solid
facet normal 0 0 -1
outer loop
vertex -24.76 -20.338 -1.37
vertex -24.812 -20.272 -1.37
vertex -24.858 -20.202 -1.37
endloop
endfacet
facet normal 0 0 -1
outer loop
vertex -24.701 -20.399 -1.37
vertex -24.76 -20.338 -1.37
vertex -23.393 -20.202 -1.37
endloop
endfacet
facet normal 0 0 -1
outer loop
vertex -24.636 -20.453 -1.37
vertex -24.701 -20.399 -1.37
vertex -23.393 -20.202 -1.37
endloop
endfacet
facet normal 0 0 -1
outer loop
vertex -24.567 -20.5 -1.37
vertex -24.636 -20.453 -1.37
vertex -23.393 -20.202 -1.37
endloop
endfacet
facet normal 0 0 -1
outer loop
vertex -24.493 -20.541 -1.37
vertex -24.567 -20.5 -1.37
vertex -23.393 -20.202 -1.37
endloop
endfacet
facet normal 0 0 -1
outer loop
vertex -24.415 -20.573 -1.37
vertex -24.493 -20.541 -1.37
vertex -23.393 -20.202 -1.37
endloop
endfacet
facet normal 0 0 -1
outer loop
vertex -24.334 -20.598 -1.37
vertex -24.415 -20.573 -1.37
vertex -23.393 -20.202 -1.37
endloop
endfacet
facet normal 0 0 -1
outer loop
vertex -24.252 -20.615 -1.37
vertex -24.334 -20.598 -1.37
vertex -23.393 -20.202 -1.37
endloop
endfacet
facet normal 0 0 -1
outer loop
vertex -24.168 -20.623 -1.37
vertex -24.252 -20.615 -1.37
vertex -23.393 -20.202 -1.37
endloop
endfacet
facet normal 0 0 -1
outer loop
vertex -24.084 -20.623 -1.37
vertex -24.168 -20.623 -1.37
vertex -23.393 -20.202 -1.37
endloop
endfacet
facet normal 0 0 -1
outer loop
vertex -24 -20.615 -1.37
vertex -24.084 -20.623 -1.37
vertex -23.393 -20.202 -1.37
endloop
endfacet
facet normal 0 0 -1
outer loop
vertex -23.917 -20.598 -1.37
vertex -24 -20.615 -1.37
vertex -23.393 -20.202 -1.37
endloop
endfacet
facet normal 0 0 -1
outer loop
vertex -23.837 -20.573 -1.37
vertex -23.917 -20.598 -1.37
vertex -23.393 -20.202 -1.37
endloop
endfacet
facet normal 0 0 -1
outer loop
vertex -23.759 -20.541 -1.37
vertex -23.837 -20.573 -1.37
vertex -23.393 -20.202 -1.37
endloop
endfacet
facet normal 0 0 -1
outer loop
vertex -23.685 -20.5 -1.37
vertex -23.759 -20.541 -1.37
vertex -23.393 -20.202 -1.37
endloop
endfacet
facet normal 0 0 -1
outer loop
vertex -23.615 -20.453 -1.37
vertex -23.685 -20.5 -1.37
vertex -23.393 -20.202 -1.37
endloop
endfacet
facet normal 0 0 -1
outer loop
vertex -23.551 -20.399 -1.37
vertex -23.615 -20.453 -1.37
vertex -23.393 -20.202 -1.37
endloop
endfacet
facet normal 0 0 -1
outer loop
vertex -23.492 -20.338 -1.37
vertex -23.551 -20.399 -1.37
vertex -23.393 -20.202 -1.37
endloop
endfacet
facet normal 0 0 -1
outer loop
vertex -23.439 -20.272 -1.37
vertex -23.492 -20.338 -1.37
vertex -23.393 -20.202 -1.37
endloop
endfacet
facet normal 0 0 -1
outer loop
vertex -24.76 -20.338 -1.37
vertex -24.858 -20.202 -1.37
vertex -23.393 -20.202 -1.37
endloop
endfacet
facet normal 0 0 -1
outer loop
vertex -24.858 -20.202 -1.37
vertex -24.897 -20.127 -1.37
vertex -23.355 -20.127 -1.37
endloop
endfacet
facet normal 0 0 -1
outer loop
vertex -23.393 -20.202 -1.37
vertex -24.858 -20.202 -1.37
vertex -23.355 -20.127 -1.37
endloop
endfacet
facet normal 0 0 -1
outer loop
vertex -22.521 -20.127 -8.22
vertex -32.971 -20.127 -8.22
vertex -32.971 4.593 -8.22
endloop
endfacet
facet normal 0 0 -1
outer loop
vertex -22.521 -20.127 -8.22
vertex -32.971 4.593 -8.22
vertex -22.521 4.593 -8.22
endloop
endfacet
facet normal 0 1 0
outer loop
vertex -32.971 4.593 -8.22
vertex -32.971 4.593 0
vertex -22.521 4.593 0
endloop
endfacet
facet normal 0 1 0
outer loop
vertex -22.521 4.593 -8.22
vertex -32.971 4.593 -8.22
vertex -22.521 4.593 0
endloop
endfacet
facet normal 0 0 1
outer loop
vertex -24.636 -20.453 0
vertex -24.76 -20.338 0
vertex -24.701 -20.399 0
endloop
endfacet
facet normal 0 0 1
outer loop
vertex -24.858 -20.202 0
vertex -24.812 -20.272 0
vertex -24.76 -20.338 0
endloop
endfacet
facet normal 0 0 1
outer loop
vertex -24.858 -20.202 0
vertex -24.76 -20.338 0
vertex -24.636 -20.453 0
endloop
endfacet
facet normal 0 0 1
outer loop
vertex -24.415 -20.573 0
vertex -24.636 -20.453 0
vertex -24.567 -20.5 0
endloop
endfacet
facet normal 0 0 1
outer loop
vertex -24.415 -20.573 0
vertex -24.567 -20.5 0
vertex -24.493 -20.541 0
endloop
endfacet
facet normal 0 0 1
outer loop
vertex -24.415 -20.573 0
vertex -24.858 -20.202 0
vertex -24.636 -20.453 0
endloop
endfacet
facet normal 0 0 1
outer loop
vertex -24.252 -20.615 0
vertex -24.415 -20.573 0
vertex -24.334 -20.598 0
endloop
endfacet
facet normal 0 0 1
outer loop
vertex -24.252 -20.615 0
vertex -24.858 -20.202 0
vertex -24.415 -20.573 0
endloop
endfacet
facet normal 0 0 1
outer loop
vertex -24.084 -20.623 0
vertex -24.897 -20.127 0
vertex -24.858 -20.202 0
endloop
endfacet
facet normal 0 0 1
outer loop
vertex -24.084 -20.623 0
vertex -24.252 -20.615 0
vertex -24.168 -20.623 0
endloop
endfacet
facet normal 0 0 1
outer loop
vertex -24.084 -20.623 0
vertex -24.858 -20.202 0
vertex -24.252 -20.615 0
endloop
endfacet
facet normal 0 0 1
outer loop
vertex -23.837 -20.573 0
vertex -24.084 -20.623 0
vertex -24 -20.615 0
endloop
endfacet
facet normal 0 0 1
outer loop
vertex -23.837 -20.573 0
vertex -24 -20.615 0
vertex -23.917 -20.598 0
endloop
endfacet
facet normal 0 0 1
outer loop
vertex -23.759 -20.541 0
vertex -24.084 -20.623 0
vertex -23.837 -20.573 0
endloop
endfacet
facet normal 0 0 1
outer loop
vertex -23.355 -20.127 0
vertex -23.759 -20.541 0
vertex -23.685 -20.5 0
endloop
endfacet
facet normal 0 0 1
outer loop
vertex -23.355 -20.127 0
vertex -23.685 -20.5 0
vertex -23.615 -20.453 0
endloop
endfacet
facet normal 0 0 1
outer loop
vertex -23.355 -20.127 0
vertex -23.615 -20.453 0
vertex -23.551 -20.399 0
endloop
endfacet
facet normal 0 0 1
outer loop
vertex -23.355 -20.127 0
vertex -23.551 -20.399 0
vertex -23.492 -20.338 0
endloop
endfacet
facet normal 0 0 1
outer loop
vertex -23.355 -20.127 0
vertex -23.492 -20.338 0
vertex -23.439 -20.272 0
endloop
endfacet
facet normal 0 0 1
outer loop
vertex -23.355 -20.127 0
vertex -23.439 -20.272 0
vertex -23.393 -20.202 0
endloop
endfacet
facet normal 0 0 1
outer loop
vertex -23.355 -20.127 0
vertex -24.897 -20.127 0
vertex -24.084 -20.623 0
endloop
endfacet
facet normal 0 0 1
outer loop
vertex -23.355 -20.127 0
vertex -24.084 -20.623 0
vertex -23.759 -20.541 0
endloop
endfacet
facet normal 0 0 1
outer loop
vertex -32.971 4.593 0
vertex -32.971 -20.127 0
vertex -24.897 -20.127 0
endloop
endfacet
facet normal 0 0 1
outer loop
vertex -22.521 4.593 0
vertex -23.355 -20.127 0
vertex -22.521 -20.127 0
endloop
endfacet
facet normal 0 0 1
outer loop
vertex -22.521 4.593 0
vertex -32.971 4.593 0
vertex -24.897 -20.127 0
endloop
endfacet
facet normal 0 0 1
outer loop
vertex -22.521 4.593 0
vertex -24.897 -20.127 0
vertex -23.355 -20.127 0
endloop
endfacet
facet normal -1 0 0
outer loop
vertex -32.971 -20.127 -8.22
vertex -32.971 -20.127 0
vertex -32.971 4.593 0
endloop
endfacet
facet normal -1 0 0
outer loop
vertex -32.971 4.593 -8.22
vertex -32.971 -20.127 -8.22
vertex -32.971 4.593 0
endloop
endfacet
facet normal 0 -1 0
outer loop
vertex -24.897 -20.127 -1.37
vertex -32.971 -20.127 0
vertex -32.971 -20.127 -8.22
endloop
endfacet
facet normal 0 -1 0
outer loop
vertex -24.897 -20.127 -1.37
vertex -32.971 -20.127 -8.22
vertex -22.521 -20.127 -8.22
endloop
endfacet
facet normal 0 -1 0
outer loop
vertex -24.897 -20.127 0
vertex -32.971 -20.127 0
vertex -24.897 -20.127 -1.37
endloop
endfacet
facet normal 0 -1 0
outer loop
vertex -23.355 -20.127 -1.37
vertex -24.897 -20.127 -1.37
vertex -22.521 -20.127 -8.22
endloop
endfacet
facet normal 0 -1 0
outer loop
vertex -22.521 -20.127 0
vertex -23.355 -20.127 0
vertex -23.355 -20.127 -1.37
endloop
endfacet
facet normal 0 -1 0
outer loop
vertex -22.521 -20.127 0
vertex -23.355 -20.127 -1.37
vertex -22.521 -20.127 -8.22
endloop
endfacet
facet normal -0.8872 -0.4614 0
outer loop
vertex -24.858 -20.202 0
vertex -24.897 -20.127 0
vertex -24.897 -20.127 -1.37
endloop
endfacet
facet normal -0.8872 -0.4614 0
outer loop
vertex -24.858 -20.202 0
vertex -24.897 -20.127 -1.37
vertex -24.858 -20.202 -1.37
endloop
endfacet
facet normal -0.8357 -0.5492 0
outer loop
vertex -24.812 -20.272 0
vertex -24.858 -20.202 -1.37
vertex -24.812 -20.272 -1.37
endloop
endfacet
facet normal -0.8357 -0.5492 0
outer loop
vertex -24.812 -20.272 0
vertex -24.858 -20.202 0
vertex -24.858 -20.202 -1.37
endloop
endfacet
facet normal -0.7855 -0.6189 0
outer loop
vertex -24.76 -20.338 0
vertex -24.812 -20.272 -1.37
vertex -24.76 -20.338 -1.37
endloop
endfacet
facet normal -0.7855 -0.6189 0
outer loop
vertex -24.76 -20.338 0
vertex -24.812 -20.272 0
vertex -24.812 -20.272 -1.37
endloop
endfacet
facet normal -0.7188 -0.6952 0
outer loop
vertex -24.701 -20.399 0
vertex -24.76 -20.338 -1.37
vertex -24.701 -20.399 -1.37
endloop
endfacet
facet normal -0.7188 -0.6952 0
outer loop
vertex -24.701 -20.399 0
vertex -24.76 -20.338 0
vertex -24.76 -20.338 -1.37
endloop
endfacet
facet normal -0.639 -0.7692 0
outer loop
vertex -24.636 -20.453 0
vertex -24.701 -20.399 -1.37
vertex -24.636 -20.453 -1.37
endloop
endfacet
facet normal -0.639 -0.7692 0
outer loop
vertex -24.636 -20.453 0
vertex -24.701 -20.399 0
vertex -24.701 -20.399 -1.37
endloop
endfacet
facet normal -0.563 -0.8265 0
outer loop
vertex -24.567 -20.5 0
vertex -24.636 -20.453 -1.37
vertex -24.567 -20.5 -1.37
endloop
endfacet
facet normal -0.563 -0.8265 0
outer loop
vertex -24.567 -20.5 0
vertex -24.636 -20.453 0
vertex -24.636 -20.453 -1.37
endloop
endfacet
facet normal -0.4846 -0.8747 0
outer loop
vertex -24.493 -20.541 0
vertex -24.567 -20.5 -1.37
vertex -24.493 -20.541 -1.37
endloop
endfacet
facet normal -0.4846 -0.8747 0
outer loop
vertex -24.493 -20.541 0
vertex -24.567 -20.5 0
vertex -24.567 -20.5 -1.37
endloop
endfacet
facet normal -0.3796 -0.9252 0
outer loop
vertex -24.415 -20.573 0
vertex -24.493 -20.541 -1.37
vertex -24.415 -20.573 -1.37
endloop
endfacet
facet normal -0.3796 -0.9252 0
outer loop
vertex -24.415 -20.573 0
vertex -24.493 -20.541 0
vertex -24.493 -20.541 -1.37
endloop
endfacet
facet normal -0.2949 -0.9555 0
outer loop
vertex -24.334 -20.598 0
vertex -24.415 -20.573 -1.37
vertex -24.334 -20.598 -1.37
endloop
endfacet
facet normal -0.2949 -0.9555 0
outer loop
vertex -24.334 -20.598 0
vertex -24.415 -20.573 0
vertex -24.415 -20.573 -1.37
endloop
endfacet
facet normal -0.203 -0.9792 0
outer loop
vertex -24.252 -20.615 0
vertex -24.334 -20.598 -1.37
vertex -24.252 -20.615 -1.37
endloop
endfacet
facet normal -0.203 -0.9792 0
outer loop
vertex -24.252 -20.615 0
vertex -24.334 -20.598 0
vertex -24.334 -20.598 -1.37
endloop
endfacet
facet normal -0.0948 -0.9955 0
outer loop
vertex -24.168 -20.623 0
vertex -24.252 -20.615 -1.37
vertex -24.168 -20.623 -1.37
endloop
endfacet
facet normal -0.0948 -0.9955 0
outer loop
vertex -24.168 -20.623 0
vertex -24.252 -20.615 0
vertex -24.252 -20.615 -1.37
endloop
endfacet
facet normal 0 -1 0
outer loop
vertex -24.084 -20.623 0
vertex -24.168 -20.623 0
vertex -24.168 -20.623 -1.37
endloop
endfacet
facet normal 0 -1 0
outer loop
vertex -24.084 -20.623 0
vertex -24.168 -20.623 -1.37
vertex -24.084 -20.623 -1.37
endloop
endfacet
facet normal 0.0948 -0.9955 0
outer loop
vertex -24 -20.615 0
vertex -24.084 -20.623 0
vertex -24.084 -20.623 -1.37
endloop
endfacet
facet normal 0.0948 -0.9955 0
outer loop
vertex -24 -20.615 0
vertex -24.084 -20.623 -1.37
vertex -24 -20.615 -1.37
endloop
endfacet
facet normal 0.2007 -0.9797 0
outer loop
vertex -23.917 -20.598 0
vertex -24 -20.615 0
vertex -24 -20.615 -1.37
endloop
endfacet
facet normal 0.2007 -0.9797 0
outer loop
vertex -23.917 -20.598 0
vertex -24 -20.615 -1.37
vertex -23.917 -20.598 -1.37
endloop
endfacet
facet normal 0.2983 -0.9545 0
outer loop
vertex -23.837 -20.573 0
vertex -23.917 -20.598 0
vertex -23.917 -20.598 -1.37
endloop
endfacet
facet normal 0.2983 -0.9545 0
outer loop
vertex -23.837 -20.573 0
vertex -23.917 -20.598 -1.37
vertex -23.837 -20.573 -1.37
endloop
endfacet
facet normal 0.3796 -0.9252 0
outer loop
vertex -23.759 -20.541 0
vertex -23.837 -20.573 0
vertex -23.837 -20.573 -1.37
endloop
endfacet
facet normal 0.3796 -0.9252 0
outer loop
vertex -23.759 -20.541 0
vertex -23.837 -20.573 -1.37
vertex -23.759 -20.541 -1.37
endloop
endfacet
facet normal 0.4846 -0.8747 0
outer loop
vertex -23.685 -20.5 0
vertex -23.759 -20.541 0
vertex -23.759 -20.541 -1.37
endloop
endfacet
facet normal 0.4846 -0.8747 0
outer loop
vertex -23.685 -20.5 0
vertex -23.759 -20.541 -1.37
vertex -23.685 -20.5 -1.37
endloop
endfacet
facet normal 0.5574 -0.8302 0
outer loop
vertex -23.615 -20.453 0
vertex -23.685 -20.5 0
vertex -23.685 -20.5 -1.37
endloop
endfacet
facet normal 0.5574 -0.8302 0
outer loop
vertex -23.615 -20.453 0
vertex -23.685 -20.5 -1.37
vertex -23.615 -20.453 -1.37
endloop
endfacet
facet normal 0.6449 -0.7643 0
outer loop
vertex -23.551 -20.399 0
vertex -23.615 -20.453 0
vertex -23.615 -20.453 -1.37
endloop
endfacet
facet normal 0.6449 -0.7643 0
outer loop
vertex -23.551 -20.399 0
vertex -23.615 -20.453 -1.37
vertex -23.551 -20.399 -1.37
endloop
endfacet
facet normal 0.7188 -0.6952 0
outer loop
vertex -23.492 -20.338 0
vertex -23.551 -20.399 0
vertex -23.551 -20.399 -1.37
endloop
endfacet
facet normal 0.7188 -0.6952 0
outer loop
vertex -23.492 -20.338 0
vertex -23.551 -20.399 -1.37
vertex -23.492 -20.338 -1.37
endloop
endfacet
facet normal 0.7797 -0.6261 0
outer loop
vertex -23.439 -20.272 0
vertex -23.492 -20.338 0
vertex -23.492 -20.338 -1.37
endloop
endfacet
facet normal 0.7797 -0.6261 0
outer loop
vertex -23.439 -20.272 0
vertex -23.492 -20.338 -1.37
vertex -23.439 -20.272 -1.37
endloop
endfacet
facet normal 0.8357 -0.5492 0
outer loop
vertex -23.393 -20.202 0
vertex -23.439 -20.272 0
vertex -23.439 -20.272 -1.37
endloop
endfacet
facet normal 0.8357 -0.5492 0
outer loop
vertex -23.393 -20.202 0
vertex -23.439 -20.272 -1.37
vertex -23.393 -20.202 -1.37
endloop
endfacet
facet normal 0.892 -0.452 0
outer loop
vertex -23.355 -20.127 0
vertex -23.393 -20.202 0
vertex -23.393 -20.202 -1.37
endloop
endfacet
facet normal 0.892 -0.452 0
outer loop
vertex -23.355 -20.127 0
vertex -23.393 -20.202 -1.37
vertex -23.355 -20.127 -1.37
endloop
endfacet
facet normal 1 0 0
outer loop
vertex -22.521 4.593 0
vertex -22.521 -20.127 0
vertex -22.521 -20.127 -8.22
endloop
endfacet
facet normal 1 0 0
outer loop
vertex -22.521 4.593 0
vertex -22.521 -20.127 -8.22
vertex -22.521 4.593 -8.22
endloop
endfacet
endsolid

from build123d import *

# Parameters (mm, degrees)
F0_W     = 10.45
F0_H     = 24.72
F1_DEPTH = 8.22
F2_R     = 0.845507
F3_DEPTH = 1.37


with BuildPart() as f1:
    # F0 (on Top) → F1 (new body)
    with BuildSketch(Plane.XY):
        with Locations((-27.746155, -7.76654)):
            Rectangle(F0_W, F0_H)
    extrude(amount=-F1_DEPTH)

    # F2 (on Top) → F3 (join)
    with BuildSketch(Plane.XY):
        with Locations((-24.125788, -19.778986)):
            Circle(F2_R)
    extrude(amount=-F3_DEPTH)


solid = f1.part
